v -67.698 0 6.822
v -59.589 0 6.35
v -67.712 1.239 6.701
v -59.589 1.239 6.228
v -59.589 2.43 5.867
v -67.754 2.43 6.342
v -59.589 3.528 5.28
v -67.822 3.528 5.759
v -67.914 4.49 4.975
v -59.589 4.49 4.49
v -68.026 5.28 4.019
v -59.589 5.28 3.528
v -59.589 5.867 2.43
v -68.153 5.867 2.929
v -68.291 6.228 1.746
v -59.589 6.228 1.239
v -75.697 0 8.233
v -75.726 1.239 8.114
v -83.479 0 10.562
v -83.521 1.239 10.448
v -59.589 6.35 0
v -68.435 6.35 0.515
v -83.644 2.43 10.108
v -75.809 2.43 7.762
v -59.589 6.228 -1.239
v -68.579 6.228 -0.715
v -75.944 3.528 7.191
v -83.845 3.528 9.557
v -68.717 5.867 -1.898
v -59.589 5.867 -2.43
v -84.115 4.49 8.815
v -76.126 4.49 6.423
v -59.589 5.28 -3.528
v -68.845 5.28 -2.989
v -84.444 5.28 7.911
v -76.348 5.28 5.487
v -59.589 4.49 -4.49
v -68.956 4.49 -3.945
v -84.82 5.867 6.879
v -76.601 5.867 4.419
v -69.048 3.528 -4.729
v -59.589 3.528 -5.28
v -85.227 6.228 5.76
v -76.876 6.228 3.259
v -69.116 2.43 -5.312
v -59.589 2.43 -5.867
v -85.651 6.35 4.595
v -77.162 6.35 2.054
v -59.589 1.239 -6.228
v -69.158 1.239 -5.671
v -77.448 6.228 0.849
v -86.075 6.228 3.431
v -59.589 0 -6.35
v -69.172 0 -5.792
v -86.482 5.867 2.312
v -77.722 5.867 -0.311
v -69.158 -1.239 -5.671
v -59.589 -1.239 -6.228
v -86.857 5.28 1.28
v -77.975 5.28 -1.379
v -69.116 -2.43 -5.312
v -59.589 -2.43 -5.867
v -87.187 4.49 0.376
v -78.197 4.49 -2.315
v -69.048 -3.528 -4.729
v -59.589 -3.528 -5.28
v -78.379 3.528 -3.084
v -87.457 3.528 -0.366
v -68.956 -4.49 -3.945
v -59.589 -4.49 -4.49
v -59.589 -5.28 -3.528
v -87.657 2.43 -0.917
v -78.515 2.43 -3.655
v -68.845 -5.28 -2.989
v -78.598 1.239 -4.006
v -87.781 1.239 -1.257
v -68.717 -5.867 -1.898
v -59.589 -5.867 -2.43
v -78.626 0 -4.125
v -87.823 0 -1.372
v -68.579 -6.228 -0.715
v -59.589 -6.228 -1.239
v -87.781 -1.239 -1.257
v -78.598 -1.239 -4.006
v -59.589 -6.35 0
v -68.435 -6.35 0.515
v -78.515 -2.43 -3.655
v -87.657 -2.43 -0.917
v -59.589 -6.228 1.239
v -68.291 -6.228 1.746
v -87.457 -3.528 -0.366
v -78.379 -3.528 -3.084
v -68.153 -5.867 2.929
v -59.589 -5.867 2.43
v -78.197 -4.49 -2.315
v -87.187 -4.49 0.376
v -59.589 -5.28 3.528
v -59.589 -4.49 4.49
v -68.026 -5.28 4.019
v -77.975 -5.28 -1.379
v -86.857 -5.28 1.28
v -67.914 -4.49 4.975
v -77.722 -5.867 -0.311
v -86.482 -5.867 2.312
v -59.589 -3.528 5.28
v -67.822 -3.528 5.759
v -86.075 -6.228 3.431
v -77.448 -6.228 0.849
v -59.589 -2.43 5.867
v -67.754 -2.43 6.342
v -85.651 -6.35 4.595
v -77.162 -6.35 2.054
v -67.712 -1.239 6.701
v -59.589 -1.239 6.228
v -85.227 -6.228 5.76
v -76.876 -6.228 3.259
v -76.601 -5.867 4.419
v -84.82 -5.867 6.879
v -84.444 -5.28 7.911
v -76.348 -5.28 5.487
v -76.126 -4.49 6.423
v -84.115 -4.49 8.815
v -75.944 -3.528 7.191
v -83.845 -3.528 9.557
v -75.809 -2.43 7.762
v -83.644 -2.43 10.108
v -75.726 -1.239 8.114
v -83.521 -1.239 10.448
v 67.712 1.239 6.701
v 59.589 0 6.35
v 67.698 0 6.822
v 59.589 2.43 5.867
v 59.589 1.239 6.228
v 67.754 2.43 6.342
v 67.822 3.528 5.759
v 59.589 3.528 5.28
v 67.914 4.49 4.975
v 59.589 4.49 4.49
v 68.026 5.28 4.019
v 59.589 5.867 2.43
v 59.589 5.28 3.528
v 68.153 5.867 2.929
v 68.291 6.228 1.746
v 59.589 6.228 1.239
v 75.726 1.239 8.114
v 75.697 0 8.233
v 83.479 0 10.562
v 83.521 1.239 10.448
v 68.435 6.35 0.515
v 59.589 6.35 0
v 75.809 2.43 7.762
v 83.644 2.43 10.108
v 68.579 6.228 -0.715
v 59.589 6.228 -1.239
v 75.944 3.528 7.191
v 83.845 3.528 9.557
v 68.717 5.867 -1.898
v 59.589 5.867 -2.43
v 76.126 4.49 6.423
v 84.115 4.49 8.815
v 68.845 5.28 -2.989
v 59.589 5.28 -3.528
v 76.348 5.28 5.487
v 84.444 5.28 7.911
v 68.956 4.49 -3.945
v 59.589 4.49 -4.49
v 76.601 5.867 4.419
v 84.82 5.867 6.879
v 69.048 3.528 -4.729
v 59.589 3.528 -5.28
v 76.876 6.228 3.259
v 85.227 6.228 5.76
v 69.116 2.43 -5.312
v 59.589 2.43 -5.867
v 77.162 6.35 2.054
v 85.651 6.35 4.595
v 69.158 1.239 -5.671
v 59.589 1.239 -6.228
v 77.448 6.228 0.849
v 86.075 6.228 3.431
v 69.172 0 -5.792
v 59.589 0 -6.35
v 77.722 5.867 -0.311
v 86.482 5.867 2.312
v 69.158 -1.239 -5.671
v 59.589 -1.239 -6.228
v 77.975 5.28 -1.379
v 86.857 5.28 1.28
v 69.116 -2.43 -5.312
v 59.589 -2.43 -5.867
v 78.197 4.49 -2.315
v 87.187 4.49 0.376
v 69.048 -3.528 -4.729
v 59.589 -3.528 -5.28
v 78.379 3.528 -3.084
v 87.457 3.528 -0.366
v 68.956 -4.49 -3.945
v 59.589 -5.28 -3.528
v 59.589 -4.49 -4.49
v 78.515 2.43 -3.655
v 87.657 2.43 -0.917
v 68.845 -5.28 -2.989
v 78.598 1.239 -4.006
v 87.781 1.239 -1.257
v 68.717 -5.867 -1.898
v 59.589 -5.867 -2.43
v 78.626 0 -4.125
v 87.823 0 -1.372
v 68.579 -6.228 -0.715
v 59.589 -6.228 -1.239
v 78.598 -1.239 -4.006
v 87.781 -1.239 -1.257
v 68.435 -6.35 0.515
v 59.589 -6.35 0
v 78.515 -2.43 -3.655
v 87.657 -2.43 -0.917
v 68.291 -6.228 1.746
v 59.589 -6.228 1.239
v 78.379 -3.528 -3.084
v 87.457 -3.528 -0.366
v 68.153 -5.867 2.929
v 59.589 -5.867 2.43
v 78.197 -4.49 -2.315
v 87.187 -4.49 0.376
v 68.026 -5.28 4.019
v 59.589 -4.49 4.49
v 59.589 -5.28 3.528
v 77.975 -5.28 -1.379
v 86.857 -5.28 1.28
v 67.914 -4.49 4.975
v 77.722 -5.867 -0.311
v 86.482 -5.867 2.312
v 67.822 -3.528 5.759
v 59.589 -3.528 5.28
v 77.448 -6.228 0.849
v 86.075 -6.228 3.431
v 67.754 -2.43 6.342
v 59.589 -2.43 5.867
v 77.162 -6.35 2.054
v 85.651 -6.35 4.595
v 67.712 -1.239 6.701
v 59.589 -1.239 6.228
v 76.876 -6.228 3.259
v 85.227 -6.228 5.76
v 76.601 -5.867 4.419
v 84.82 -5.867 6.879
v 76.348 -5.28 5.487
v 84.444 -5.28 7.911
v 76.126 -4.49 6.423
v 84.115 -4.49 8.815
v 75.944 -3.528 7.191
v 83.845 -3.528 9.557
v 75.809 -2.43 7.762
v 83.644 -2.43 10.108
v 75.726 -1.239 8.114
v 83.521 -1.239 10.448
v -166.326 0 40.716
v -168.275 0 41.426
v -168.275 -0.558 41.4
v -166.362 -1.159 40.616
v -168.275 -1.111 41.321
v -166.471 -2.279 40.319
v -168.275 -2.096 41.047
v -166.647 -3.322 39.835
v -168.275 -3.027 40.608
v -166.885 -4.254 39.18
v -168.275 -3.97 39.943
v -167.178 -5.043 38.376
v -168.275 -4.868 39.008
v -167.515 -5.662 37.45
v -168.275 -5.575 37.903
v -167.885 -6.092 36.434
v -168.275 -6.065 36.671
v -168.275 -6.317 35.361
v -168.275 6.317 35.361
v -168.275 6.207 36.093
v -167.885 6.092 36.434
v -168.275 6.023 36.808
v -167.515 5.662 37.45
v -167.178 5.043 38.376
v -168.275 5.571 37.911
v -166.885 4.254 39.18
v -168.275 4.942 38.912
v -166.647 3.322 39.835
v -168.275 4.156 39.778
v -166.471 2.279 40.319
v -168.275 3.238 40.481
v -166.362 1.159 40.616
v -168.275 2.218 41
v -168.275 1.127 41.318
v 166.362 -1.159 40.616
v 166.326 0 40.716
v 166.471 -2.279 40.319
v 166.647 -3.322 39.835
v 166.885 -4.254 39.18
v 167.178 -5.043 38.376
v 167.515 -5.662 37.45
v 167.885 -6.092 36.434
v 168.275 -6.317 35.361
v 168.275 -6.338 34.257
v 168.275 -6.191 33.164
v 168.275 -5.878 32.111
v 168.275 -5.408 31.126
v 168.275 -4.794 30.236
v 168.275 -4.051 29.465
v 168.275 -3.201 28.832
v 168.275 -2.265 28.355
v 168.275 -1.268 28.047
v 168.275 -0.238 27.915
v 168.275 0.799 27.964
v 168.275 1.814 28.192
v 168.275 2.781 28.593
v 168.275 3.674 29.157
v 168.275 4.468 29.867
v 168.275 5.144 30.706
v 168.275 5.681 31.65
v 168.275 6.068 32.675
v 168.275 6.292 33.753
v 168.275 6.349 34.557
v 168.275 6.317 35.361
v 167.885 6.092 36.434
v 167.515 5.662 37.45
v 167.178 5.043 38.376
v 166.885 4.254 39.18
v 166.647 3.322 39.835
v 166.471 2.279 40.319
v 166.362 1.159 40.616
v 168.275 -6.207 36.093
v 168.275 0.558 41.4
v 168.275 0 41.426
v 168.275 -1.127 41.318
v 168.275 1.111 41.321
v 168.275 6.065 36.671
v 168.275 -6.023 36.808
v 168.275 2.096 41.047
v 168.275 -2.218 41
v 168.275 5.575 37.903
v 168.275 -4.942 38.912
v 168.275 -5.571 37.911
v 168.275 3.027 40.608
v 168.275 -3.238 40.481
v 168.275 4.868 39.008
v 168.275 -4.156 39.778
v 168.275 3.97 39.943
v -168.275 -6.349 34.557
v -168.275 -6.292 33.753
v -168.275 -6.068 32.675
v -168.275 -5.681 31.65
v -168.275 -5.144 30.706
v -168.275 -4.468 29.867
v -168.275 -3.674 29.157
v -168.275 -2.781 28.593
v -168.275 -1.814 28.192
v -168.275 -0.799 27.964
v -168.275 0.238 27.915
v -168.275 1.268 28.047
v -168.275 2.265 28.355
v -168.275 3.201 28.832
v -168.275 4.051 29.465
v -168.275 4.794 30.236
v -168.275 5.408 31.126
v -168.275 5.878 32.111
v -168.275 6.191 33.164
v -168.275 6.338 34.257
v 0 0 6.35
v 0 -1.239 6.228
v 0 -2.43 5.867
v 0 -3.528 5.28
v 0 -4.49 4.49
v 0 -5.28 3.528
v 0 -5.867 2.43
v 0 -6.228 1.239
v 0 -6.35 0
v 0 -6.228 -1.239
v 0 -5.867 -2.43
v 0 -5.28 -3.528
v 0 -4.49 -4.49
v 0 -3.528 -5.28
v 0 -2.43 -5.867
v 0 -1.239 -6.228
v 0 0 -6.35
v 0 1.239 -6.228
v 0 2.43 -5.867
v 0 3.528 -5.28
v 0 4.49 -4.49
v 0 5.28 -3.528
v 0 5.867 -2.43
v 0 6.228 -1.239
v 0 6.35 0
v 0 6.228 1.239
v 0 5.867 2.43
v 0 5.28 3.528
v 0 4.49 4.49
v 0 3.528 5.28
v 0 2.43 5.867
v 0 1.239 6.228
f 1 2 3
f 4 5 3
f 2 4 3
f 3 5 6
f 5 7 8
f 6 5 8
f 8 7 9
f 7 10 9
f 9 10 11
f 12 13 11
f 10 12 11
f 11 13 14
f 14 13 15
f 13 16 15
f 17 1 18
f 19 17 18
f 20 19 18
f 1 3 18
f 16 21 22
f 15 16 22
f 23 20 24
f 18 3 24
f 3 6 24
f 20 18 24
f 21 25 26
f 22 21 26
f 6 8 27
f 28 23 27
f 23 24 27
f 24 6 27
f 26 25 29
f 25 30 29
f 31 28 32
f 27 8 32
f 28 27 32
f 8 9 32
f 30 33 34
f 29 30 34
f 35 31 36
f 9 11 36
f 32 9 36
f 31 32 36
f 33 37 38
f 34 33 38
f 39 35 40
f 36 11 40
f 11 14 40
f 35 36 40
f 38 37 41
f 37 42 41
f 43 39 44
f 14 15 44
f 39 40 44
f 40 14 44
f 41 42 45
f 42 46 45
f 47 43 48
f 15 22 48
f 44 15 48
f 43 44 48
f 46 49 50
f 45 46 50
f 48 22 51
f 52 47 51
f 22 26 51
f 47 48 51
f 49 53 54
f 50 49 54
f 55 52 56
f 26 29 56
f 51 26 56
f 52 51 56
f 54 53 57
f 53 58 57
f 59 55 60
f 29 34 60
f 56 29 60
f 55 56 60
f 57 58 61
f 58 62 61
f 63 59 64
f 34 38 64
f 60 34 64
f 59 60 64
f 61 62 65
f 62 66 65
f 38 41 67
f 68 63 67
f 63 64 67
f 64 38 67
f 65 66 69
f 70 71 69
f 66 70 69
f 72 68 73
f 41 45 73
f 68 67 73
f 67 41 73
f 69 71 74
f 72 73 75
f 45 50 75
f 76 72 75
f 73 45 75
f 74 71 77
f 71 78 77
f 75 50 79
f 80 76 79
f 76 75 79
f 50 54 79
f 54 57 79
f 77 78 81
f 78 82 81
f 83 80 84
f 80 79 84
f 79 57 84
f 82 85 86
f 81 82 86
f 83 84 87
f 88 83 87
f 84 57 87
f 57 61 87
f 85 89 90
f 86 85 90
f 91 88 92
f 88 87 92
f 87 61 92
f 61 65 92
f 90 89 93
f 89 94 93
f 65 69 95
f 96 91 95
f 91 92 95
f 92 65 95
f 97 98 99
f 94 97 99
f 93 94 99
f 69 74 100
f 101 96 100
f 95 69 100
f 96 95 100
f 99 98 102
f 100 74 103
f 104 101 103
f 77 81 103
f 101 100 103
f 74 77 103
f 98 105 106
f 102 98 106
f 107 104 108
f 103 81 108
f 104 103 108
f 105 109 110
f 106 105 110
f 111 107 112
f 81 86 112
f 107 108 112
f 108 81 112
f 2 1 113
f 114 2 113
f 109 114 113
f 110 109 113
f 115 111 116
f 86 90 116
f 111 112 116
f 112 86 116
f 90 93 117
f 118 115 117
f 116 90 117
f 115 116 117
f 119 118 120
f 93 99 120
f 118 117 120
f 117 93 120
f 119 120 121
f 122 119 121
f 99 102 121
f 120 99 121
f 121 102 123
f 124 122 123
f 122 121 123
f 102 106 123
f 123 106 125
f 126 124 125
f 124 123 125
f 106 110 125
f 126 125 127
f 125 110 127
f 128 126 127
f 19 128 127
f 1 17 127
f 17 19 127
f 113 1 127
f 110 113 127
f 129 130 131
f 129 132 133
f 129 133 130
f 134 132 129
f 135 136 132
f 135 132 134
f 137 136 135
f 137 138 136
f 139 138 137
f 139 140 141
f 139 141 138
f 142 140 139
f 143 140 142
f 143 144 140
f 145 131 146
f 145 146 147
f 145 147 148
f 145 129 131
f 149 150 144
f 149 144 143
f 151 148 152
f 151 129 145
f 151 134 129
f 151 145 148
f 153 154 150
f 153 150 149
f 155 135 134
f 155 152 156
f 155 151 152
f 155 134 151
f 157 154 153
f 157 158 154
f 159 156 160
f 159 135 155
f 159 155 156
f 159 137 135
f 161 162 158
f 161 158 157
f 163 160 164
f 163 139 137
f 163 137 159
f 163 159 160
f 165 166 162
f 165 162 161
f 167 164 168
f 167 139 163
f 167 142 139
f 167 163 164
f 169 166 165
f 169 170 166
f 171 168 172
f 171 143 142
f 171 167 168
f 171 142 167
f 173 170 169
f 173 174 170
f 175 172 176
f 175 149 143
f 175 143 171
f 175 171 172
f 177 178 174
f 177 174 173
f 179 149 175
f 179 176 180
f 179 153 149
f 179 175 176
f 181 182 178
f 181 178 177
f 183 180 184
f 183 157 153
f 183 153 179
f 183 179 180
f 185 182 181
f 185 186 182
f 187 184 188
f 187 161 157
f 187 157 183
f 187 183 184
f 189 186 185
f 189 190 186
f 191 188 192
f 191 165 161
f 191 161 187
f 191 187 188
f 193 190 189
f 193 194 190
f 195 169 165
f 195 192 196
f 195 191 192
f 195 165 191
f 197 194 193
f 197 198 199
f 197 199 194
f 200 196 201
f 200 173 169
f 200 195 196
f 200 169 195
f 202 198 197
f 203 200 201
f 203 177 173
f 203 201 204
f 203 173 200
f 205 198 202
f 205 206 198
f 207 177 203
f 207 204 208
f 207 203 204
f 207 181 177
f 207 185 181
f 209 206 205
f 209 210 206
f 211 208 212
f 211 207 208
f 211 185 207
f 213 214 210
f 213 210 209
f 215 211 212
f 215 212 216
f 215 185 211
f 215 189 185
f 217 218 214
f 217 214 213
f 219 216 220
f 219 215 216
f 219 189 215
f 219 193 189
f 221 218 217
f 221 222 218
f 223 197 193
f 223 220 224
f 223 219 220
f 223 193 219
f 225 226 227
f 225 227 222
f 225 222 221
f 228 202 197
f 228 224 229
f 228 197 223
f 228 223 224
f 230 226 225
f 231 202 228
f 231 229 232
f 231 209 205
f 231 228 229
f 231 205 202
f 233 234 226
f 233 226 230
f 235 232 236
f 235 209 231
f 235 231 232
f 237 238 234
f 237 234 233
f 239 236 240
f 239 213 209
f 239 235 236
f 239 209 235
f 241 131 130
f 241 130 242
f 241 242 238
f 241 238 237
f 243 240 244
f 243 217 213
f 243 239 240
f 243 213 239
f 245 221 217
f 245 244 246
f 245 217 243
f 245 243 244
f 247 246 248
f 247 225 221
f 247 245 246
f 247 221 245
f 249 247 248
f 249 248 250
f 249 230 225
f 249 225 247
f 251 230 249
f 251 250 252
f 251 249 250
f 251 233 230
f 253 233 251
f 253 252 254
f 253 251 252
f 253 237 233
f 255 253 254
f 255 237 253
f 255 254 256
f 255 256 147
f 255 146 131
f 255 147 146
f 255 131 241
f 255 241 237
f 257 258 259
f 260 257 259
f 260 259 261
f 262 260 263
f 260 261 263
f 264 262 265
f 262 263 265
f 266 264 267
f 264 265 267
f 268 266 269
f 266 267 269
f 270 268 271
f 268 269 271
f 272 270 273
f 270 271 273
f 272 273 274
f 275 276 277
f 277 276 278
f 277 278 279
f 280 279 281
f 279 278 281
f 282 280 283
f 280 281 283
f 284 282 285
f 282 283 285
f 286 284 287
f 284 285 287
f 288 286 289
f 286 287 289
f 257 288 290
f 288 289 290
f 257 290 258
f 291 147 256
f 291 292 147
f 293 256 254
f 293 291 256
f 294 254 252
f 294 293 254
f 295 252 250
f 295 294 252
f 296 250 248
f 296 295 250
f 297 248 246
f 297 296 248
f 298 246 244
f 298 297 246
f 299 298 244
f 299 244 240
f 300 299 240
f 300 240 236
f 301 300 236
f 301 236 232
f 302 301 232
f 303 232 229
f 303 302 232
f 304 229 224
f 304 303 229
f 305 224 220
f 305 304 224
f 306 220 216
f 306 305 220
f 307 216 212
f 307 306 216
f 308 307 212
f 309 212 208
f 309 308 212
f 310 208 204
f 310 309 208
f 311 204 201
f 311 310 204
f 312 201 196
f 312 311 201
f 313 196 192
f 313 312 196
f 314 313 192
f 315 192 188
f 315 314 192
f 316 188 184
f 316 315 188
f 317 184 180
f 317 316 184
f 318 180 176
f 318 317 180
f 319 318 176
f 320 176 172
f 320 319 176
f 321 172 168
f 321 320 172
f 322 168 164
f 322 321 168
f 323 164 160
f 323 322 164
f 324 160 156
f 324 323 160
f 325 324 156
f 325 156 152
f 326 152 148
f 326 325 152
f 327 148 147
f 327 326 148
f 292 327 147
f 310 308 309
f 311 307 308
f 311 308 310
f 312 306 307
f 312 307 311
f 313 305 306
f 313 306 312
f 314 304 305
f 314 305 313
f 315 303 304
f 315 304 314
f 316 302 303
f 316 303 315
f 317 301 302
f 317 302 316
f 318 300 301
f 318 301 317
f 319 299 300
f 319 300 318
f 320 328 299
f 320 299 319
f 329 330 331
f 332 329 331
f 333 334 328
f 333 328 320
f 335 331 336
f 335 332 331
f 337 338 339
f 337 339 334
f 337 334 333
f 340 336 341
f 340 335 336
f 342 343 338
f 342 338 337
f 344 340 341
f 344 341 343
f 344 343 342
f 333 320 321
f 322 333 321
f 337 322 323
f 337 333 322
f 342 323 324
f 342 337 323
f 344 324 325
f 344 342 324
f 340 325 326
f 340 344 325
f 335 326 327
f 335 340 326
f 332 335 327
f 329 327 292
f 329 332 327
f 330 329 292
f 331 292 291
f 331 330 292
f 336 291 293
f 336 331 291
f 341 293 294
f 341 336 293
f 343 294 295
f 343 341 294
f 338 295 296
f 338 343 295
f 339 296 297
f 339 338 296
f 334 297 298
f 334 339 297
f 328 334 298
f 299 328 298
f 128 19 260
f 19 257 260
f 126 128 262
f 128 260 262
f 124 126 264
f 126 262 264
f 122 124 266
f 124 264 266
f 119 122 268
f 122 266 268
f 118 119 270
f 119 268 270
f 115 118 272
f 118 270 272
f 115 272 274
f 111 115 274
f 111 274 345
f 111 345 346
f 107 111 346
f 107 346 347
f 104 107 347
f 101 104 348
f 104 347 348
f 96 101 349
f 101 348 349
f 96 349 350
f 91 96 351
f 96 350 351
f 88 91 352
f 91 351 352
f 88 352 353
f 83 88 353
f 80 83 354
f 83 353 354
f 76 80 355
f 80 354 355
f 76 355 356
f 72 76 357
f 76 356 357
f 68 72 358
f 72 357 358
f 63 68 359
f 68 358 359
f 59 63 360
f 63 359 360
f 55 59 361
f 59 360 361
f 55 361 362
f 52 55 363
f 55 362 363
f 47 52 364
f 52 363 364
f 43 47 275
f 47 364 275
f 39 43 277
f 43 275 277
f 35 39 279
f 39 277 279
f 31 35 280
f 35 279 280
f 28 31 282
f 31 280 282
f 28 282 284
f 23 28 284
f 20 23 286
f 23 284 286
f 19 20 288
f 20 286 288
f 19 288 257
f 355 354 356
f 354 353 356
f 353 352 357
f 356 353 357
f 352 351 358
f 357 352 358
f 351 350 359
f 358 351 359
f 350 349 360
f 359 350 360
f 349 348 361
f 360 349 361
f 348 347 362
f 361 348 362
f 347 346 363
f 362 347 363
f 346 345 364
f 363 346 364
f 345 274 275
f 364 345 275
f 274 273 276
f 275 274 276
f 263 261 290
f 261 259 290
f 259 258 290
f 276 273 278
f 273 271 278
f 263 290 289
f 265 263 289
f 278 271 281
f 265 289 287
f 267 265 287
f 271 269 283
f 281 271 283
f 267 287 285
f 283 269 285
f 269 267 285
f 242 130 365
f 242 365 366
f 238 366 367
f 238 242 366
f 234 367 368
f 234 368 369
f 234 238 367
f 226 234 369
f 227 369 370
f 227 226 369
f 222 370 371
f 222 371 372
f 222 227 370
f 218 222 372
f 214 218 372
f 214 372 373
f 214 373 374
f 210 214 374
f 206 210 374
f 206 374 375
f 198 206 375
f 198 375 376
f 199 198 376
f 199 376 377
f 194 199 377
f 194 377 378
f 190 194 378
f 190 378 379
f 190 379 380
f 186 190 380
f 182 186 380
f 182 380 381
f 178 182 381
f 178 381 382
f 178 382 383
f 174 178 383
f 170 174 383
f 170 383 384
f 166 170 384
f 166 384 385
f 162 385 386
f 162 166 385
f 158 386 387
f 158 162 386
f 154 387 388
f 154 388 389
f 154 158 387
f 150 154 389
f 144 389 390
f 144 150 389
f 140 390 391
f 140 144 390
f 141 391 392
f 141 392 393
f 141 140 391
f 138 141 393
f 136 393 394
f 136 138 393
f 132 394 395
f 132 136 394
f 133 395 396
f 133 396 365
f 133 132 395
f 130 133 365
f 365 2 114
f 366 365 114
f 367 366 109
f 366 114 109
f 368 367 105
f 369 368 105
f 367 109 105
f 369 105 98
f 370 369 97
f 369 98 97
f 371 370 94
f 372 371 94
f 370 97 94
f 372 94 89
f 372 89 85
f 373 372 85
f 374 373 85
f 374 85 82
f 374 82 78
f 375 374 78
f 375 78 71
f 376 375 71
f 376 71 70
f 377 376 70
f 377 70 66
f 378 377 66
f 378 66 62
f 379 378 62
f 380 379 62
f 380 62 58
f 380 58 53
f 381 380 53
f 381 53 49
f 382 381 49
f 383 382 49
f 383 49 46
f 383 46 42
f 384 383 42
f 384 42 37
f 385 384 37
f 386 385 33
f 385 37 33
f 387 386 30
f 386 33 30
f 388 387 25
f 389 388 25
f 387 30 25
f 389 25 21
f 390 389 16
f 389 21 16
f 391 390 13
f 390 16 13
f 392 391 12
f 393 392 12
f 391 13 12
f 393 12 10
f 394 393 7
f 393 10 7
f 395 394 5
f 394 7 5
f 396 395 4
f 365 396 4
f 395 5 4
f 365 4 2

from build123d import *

# Parameters (mm, degrees)
SWEEP1_PROFILE_R     = 6.35
CUT_SWEEP2_START     = 168.275
CUT_SWEEP2_OUTLINE_W = 16
CUT_SWEEP2_OUTLINE_H = 42
CUT_SWEEP2_DEPTH     = 73.999175886


# Read off the part's stored shape, not the designer's step: Cut-Sweep2
with BuildPart() as part:
    # Sweep1: sweep along a path in Sketch1
    with BuildLine(Plane(origin=(0, 0, 0), x_dir=(1, 0, 0), z_dir=(0, 1, 0))) as sweep1_path:
        Line((0, 0), (59.58888407, 0))
        ThreePointArc((59.58888407, 0), (72.820875208, -1.15764922), (85.650818991, -4.595422296))
        Line((85.650818991, -4.595422296), (168.497770272, -34.749246562))
        Line((168.497770272, -34.749246562), (240.102347976, -60.811181483))
    # Sweep1 profile (on start of the path) → Sweep1 (sweep)
    with BuildSketch(Plane(origin=(0, 0, 0), x_dir=(0, 0, 1), z_dir=(1, 0, 0))):
        Circle(SWEEP1_PROFILE_R)
    sweep1 = sweep(path=sweep1_path.line)

    # Cut-Sweep2 outline → Cut-Sweep2 (cut)
    with BuildSketch(Plane.YZ.offset(CUT_SWEEP2_START)):
        with Locations((0, 47)):
            Rectangle(CUT_SWEEP2_OUTLINE_W, CUT_SWEEP2_OUTLINE_H)
    cut_sweep2 = extrude(amount=CUT_SWEEP2_DEPTH, mode=Mode.SUBTRACT)

    # Mirror1: Sweep1, Cut-Sweep2 across plane
    add(sweep1.mirror(Plane(origin=(0, 0, 0), x_dir=(0, 0, 1), z_dir=(1, 0, 0))))
    add(cut_sweep2.mirror(Plane(origin=(0, 0, 0), x_dir=(0, 0, 1), z_dir=(1, 0, 0))), mode=Mode.SUBTRACT)


solid = part.part
